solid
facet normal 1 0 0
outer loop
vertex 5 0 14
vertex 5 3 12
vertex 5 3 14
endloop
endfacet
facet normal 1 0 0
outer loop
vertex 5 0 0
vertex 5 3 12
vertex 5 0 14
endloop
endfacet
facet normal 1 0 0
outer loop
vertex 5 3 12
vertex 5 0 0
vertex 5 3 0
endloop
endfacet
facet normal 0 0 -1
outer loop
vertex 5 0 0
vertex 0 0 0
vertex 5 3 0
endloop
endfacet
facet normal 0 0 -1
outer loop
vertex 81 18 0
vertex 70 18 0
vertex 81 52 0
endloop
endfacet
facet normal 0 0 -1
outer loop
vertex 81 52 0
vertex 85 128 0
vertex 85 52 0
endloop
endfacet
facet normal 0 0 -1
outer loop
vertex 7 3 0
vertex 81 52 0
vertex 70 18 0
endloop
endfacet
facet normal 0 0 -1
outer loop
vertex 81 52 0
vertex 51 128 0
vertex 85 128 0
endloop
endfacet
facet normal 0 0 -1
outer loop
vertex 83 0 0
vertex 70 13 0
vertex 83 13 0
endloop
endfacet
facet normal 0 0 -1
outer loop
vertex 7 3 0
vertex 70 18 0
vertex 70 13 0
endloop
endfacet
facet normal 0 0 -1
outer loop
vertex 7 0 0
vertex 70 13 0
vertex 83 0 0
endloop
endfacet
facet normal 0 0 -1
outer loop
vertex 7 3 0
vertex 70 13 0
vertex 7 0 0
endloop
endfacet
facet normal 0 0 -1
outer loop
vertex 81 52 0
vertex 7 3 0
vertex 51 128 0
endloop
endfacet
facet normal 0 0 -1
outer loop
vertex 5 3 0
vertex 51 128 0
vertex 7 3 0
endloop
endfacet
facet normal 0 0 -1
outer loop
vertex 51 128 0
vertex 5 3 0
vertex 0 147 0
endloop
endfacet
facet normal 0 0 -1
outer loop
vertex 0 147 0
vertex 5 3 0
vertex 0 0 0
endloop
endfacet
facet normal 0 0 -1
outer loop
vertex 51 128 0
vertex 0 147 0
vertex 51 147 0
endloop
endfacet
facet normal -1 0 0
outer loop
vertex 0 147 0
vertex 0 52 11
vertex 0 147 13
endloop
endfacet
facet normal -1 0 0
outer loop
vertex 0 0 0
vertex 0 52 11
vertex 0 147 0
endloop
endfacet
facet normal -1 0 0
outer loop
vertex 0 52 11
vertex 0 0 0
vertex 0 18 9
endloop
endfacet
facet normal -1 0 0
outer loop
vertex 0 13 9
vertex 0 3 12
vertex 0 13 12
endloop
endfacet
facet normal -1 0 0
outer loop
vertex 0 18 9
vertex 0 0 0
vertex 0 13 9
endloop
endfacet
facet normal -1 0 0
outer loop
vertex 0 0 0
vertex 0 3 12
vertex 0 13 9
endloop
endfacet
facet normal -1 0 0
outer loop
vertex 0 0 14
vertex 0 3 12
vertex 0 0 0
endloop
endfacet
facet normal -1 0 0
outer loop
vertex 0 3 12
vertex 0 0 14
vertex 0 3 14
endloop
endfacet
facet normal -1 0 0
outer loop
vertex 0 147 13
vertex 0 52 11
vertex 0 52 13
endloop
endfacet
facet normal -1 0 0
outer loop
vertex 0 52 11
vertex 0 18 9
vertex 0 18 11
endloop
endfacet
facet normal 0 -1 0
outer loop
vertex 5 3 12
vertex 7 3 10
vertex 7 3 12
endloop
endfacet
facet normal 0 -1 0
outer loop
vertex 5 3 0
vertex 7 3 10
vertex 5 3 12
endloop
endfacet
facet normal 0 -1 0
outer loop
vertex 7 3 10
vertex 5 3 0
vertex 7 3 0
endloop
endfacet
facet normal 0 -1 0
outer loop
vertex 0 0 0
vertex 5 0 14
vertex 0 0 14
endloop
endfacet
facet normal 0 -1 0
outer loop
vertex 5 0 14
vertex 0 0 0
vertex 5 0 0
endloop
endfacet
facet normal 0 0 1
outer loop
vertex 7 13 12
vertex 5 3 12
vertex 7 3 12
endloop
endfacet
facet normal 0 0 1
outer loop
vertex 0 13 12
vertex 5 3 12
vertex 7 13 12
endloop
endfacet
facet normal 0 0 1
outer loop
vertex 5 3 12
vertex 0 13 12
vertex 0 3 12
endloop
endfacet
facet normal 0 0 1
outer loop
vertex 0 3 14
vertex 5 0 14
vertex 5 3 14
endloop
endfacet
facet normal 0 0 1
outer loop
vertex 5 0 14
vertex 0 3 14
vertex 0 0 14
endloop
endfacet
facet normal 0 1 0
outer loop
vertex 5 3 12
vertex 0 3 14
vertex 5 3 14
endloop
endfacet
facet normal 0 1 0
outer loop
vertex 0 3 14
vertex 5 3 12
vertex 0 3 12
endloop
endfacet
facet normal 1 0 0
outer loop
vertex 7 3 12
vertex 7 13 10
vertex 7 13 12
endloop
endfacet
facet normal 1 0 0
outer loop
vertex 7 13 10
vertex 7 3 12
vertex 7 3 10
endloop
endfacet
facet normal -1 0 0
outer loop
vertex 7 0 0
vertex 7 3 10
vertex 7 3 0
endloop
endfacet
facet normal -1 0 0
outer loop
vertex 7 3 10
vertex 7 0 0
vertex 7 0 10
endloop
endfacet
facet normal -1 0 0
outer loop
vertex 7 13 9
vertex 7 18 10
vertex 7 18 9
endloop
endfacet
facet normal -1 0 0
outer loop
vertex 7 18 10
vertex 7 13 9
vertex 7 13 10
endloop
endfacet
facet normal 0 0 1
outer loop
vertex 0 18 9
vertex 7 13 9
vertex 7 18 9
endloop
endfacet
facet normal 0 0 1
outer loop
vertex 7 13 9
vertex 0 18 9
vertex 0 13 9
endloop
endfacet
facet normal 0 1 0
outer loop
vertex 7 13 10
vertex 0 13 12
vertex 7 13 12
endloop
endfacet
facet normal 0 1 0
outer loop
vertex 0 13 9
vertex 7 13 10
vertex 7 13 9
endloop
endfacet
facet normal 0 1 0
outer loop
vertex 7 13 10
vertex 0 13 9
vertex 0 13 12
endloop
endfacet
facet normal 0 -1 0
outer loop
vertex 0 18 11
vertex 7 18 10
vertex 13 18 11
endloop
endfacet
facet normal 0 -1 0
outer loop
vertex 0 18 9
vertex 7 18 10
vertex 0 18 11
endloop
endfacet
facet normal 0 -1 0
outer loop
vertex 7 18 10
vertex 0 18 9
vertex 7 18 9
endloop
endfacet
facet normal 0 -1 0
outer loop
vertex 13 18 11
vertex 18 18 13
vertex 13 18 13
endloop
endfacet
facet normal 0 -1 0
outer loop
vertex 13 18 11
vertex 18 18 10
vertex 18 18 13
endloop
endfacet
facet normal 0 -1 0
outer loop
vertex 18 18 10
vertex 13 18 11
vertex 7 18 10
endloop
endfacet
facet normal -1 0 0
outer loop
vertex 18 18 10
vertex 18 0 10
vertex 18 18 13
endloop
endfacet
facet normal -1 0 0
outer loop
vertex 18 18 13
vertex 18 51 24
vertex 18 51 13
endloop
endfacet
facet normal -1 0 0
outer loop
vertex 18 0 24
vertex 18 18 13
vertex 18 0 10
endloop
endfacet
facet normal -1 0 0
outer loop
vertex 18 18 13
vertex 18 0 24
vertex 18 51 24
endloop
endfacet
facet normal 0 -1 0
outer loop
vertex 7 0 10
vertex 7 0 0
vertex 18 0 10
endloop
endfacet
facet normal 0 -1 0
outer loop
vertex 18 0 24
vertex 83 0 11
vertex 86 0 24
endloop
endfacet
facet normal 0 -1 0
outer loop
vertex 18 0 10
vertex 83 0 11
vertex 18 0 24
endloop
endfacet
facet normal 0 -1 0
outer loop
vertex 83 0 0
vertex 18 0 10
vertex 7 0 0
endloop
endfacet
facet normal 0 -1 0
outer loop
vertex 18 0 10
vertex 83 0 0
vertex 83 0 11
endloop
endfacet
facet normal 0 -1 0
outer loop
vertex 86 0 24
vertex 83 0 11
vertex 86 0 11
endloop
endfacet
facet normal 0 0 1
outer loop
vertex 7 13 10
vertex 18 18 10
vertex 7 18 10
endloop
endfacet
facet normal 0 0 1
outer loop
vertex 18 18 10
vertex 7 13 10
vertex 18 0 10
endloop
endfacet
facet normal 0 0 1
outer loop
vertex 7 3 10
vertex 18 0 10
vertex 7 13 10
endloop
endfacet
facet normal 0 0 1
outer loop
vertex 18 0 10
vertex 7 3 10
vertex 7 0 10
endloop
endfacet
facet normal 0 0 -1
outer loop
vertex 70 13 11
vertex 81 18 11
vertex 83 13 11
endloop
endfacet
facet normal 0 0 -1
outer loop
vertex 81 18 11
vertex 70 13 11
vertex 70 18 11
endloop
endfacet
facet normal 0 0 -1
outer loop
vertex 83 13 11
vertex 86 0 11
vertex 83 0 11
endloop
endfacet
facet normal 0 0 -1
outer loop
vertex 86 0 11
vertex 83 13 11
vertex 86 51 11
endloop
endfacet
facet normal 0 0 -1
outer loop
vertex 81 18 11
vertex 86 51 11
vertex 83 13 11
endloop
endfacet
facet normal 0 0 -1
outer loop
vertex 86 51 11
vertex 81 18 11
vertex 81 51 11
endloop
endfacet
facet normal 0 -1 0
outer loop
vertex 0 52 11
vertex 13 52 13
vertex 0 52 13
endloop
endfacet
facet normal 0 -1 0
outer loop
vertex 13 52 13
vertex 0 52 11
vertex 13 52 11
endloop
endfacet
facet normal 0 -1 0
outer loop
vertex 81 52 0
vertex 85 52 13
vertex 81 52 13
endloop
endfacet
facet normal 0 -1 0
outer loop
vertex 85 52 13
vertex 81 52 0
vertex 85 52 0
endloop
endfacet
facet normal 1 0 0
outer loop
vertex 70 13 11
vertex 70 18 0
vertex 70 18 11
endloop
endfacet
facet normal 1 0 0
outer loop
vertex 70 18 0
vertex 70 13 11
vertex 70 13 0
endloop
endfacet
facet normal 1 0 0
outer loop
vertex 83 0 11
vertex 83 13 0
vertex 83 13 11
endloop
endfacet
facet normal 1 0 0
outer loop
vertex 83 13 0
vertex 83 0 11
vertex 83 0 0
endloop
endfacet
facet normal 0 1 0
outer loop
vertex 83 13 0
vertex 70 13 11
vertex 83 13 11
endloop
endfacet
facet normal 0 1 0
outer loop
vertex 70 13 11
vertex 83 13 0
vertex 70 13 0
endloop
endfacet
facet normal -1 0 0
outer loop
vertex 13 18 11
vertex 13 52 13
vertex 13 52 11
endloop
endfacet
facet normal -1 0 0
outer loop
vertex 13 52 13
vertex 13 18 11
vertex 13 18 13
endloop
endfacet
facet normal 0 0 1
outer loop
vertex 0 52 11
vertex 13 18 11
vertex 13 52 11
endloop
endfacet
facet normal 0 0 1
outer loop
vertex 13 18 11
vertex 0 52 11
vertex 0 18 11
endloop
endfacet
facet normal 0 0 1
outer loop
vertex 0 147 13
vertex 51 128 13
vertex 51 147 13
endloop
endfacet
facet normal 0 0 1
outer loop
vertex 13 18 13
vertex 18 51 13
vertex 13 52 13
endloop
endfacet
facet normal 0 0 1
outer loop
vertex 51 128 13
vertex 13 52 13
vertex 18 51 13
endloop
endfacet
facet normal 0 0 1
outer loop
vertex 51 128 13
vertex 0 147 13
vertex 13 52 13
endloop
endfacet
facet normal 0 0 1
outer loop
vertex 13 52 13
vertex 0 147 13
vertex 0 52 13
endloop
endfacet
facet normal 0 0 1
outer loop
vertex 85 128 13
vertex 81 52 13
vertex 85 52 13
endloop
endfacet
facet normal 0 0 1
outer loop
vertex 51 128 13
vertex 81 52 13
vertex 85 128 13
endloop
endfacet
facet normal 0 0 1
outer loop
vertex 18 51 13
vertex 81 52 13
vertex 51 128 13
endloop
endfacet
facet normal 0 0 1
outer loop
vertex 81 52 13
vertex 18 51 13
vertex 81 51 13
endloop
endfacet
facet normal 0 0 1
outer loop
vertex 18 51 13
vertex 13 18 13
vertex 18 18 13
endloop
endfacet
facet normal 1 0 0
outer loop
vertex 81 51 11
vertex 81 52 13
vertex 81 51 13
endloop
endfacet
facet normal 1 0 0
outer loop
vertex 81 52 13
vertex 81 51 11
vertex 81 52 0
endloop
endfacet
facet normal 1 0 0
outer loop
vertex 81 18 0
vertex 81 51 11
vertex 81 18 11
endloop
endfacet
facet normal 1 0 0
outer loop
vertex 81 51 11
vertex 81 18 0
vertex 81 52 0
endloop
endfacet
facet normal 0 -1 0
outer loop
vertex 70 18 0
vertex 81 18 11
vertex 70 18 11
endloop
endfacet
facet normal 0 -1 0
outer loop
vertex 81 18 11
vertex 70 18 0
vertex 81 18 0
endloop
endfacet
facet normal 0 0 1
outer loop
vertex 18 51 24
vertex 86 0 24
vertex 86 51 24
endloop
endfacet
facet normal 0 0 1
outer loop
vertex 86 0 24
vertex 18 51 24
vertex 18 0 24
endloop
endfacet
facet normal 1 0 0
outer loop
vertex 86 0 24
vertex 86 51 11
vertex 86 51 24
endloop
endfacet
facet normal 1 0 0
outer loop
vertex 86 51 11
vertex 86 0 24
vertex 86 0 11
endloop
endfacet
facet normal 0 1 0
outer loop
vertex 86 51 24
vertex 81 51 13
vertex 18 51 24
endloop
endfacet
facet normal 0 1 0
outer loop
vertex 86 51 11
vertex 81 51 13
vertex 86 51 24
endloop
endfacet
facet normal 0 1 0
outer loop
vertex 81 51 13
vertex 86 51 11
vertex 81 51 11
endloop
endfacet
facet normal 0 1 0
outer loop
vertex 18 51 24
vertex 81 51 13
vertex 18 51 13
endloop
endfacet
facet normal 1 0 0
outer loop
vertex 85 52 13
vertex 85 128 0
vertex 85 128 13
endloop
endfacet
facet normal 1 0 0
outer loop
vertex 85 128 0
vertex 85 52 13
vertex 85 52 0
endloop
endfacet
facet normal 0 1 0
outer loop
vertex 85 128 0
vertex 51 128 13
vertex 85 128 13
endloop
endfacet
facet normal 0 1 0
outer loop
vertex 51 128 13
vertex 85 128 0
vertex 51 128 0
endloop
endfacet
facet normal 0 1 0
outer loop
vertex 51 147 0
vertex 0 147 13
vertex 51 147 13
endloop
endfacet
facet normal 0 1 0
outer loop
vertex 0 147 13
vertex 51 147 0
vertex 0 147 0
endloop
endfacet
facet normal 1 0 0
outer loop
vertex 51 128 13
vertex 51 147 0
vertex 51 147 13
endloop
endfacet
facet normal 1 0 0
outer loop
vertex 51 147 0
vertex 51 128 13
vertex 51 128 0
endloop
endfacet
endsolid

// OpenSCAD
translate([2.5, 1.5, 1.0]) color([0.2744726552452267, 0.9449450132107339, 0.9264967100320902]) cube([5, 3, 2], center=true);
translate([2.5, 1.5, 3.0]) color([0.07792452404752792, 0.44817970124433604, 0.7440362849370825]) cube([5, 3, 2], center=true);
translate([2.5, 1.5, 5.0]) color([0.44965407150807035, 0.5088990248364155, 0.8068239376717178]) cube([5, 3, 2], center=true);
translate([2.5, 1.5, 7.0]) color([0.7049921609492721, 0.9580042227229432, 0.16448599428307875]) cube([5, 3, 2], center=true);
translate([2.5, 1.5, 9.0]) color([0.9235592861863212, 0.9279862525071727, 0.6347489386405218]) cube([5, 3, 2], center=true);
translate([2.5, 1.5, 11.0]) color([0.9403908272970672, 0.25268558738542024, 0.8817872834036474]) cube([5, 3, 2], center=true);
translate([2.5, 1.5, 13.0]) color([0.7734792929601902, 0.6096889997106941, 0.09062924464806255]) cube([5, 3, 2], center=true);
translate([3.5, 5.5, 1.5]) color([0.030134353730962182, 0.01096949549411852, 0.2505580574481764]) cube([7, 5, 3], center=true);
translate([3.5, 5.5, 4.5]) color([0.7623524099431817, 0.3866250323922331, 0.7754467251552132]) cube([7, 5, 3], center=true);
translate([3.5, 5.5, 7.5]) color([0.6256424909314248, 0.3892618991218443, 0.8801466287862422]) cube([7, 5, 3], center=true);
translate([3.5, 5.5, 10.5]) color([0.03841723935819574, 0.465312990207844, 0.8298523393928158]) cube([7, 5, 3], center=true);
translate([3.5, 10.5, 1.5]) color([0.12681348297309336, 0.7104875615116192, 0.32811584191028165]) cube([7, 5, 3], center=true);
translate([3.5, 10.5, 4.5]) color([0.02430127857694553, 0.4737249308893109, 0.521692738945335]) cube([7, 5, 3], center=true);
translate([3.5, 10.5, 7.5]) color([0.04158625067384558, 0.5659193535517807, 0.34743383795783944]) cube([7, 5, 3], center=true);
translate([3.5, 10.5, 10.5]) color([0.004493207256296983, 0.19077338067656535, 0.11081067227867492]) cube([7, 5, 3], center=true);
translate([3.5, 15.5, 1.5]) color([0.5406219547324049, 0.043120163042338455, 0.9281325700980793]) cube([7, 5, 3], center=true);
translate([3.5, 15.5, 4.5]) color([0.8450619723983726, 0.9452976437314561, 0.31480103278643345]) cube([7, 5, 3], center=true);
translate([3.5, 15.5, 7.5]) color([0.9052673885618943, 0.984312422520035, 0.7647314342526466]) cube([7, 5, 3], center=true);
translate([12.5, 3.5, 2.5]) color([0.2750826135755835, 0.6708893041471536, 0.5956631537339799]) cube([11, 7, 5], center=true);
translate([12.5, 3.5, 7.5]) color([0.40420330216444333, 0.3060978540144266, 0.059848190567730275]) cube([11, 7, 5], center=true);
translate([12.5, 10.5, 2.5]) color([0.12538247475645914, 0.13395615600511968, 0.48089286465431025]) cube([11, 7, 5], center=true);
translate([12.5, 10.5, 7.5]) color([0.6418933847268948, 0.7640684524444807, 0.046713759972221824]) cube([11, 7, 5], center=true);
translate([12.5, 17.5, 2.5]) color([0.8237598726124178, 0.04347122329095843, 0.5549468300580123]) cube([11, 7, 5], center=true);
translate([12.5, 17.5, 7.5]) color([0.7441478498080107, 0.631221371794228, 0.949678675683002]) cube([11, 7, 5], center=true);
translate([12.5, 24.5, 2.5]) color([0.3446983531128357, 0.5858833552375392, 0.08279906273431636]) cube([11, 7, 5], center=true);
translate([24.5, 3.5, 5.5]) color([0.5597965879322987, 0.8132988010762888, 0.20160451382548072]) cube([13, 7, 11], center=true);
translate([24.5, 10.5, 5.5]) color([0.26096450036718066, 0.7004056402196938, 0.25388196693606324]) cube([13, 7, 11], center=true);
translate([24.5, 17.5, 5.5]) color([0.25924547402140496, 0.9355152879393015, 0.9985430308431146]) cube([13, 7, 11], center=true);
translate([24.5, 24.5, 5.5]) color([0.15519843069219807, 0.9001623872580004, 0.552726485973739]) cube([13, 7, 11], center=true);
translate([24.5, 31.5, 5.5]) color([0.038601142410517486, 0.5855027152371853, 0.641549650670755]) cube([13, 7, 11], center=true);
translate([37.5, 6.5, 5.5]) color([0.0337956987021093, 0.7576919221586004, 0.817800141474185]) cube([13, 13, 11], center=true);
translate([37.5, 19.5, 5.5]) color([0.07164324218695617, 0.6483999400661788, 0.4565474809027662]) cube([13, 13, 11], center=true);
translate([37.5, 32.5, 5.5]) color([0.2387212873419211, 0.4586703816224843, 0.15938970975228217]) cube([13, 13, 11], center=true);
translate([37.5, 45.5, 5.5]) color([0.33366590673229635, 0.6552072997009475, 0.4764855561518734]) cube([13, 13, 11], center=true);
translate([50.5, 6.5, 5.5]) color([0.5559200946775417, 0.5434427938045303, 0.8205942401116392]) cube([13, 13, 11], center=true);
translate([50.5, 19.5, 5.5]) color([0.3433827981536126, 0.8129620907818157, 0.07998708713040747]) cube([13, 13, 11], center=true);
translate([50.5, 32.5, 5.5]) color([0.4277330458726053, 0.352320116536872, 0.451580638705249]) cube([13, 13, 11], center=true);
translate([50.5, 45.5, 5.5]) color([0.8335098205362665, 0.5123994004879511, 0.9872466462948367]) cube([13, 13, 11], center=true);
translate([63.5, 6.5, 5.5]) color([0.8614607202751068, 0.11884674531302208, 0.3168915355616677]) cube([13, 13, 11], center=true);
translate([63.5, 19.5, 5.5]) color([0.022725501526886682, 0.7337534213446073, 0.019200804366837798]) cube([13, 13, 11], center=true);
translate([63.5, 32.5, 5.5]) color([0.8859385148247924, 0.19334286484226215, 0.4138362902804684]) cube([13, 13, 11], center=true);
translate([63.5, 45.5, 5.5]) color([0.06203930600614804, 0.3112548872587563, 0.3895149894928328]) cube([13, 13, 11], center=true);
translate([76.5, 6.5, 5.5]) color([0.052230973545080106, 0.7675506531778632, 0.7113497195255859]) cube([13, 13, 11], center=true);
translate([6.5, 26.5, 5.5]) color([0.35788362412452357, 0.835192553154071, 0.07742180234362261]) cube([13, 17, 11], center=true);
translate([6.5, 43.5, 5.5]) color([0.05400640100767218, 0.35498029443727297, 0.9018413321683949]) cube([13, 17, 11], center=true);
translate([21.5, 26.5, 6.5]) color([0.7564677019106462, 0.6723176785539303, 0.5627357352457344]) cube([17, 17, 13], center=true);
translate([21.5, 43.5, 6.5]) color([0.80376553873448, 0.41222669318814775, 0.030688579780824843]) cube([17, 17, 13], center=true);
translate([38.5, 26.5, 6.5]) color([0.8024042864453003, 0.1904934342897321, 0.3876588498360868]) cube([17, 17, 13], center=true);
translate([38.5, 43.5, 6.5]) color([0.3576093472265096, 0.12336562593420342, 0.3507843689720118]) cube([17, 17, 13], center=true);
translate([55.5, 26.5, 6.5]) color([0.17708687785091481, 0.6160138300848896, 0.6534343577697814]) cube([17, 17, 13], center=true);
translate([55.5, 43.5, 6.5]) color([0.013646552881622753, 0.45647585236099164, 0.5540526564867162]) cube([17, 17, 13], center=true);
translate([72.5, 26.5, 6.5]) color([0.8716629944357835, 0.49603131023446156, 0.08045043690485232]) cube([17, 17, 13], center=true);
translate([72.5, 43.5, 6.5]) color([0.051723879096013836, 0.8621090829516437, 0.7907294093349121]) cube([17, 17, 13], center=true);
translate([26.5, 8.5, 17.5]) color([0.8584479311516113, 0.262242667584096, 0.6479973607947307]) cube([17, 17, 13], center=true);
translate([26.5, 25.5, 17.5]) color([0.09571804729550981, 0.8265731117136212, 0.33361293642632384]) cube([17, 17, 13], center=true);
translate([43.5, 8.5, 17.5]) color([0.9551472373193942, 0.4713825655590471, 0.0330676969459045]) cube([17, 17, 13], center=true);
translate([43.5, 25.5, 17.5]) color([0.909055877600589, 0.6255321488137767, 0.2870812860118641]) cube([17, 17, 13], center=true);
translate([60.5, 8.5, 17.5]) color([0.03680389375035842, 0.37668639673062454, 0.15686055976460878]) cube([17, 17, 13], center=true);
translate([60.5, 25.5, 17.5]) color([0.5482803113458813, 0.14688367516218315, 0.1746142788181122]) cube([17, 17, 13], center=true);
translate([77.5, 8.5, 17.5]) color([0.920869485728258, 0.6401200345146435, 0.24258141177262083]) cube([17, 17, 13], center=true);
translate([77.5, 25.5, 17.5]) color([0.8788962806324696, 0.6247158298512584, 0.9455993400800832]) cube([17, 17, 13], center=true);
translate([26.5, 42.5, 17.5]) color([0.4829167944087076, 0.8879008339780402, 0.678443807349386]) cube([17, 17, 13], center=true);
translate([43.5, 42.5, 17.5]) color([0.04416855593342761, 0.24029049005859915, 0.2815764049334011]) cube([17, 17, 13], center=true);
translate([60.5, 42.5, 17.5]) color([0.17001668338644926, 0.23818695062460127, 0.22604014846400422]) cube([17, 17, 13], center=true);
translate([77.5, 42.5, 17.5]) color([0.8783437492009086, 0.4628987935430291, 0.8765118313236592]) cube([17, 17, 13], center=true);
translate([8.5, 61.5, 6.5]) color([0.1379978834577653, 0.5649184865561083, 0.013467678145623552]) cube([17, 19, 13], center=true);
translate([25.5, 61.5, 6.5]) color([0.9303014098379871, 0.005637114397734955, 0.3899076485519639]) cube([17, 19, 13], center=true);
translate([42.5, 61.5, 6.5]) color([0.8015859586891702, 0.9998815592294843, 0.019509740361318695]) cube([17, 19, 13], center=true);
translate([59.5, 61.5, 6.5]) color([0.8240854838738103, 0.510087959495908, 0.038182020539084705]) cube([17, 19, 13], center=true);
translate([76.5, 61.5, 6.5]) color([0.7771192709025531, 0.11190241257102229, 0.6114741872824333]) cube([17, 19, 13], center=true);
translate([8.5, 80.5, 6.5]) color([0.7783252161231047, 0.6735909267280185, 0.3798743247069636]) cube([17, 19, 13], center=true);
translate([25.5, 80.5, 6.5]) color([0.026441636821160075, 0.43626396781238774, 0.9136944836857255]) cube([17, 19, 13], center=true);
translate([42.5, 80.5, 6.5]) color([0.33292336546782575, 0.24795871915323087, 0.13783083382268813]) cube([17, 19, 13], center=true);
translate([59.5, 80.5, 6.5]) color([0.5102524550010475, 0.5333482727437294, 0.07304824240354912]) cube([17, 19, 13], center=true);
translate([76.5, 80.5, 6.5]) color([0.40775848601839615, 0.6586814548864428, 0.9660506851714608]) cube([17, 19, 13], center=true);
translate([8.5, 99.5, 6.5]) color([0.43154112171906467, 0.4360353368941353, 0.47113397256850664]) cube([17, 19, 13], center=true);
translate([25.5, 99.5, 6.5]) color([0.2250334912265638, 0.3948376420144343, 0.6452647259919572]) cube([17, 19, 13], center=true);
translate([42.5, 99.5, 6.5]) color([0.39705920905186254, 0.5813757484333044, 0.8355822879997544]) cube([17, 19, 13], center=true);
translate([59.5, 99.5, 6.5]) color([0.997967573075557, 0.8850396836294676, 0.3717966269131009]) cube([17, 19, 13], center=true);
translate([76.5, 99.5, 6.5]) color([0.02172713431740758, 0.6116045995026433, 0.4745507082101075]) cube([17, 19, 13], center=true);
translate([8.5, 118.5, 6.5]) color([0.23701711204858011, 0.040304099105049285, 0.3215702389727013]) cube([17, 19, 13], center=true);
translate([25.5, 118.5, 6.5]) color([0.7980713128356309, 0.9641190068878396, 0.10666013907247773]) cube([17, 19, 13], center=true);
translate([42.5, 118.5, 6.5]) color([0.8776394117814497, 0.04871767121707815, 0.7134758188756509]) cube([17, 19, 13], center=true);
translate([59.5, 118.5, 6.5]) color([0.026795713363172546, 0.4210496822819296, 0.8702308384812625]) cube([17, 19, 13], center=true);
translate([76.5, 118.5, 6.5]) color([0.39310814762828206, 0.9245643176497426, 0.7131951411119577]) cube([17, 19, 13], center=true);
translate([8.5, 137.5, 6.5]) color([0.6041842807977467, 0.16137904800183167, 0.34049578364460964]) cube([17, 19, 13], center=true);
translate([25.5, 137.5, 6.5]) color([0.4110961642787554, 0.5902048641324954, 0.9960381602092927]) cube([17, 19, 13], center=true);
translate([42.5, 137.5, 6.5]) color([0.2837097478049315, 0.5035628908314976, 0.9334479076287334]) cube([17, 19, 13], center=true);
